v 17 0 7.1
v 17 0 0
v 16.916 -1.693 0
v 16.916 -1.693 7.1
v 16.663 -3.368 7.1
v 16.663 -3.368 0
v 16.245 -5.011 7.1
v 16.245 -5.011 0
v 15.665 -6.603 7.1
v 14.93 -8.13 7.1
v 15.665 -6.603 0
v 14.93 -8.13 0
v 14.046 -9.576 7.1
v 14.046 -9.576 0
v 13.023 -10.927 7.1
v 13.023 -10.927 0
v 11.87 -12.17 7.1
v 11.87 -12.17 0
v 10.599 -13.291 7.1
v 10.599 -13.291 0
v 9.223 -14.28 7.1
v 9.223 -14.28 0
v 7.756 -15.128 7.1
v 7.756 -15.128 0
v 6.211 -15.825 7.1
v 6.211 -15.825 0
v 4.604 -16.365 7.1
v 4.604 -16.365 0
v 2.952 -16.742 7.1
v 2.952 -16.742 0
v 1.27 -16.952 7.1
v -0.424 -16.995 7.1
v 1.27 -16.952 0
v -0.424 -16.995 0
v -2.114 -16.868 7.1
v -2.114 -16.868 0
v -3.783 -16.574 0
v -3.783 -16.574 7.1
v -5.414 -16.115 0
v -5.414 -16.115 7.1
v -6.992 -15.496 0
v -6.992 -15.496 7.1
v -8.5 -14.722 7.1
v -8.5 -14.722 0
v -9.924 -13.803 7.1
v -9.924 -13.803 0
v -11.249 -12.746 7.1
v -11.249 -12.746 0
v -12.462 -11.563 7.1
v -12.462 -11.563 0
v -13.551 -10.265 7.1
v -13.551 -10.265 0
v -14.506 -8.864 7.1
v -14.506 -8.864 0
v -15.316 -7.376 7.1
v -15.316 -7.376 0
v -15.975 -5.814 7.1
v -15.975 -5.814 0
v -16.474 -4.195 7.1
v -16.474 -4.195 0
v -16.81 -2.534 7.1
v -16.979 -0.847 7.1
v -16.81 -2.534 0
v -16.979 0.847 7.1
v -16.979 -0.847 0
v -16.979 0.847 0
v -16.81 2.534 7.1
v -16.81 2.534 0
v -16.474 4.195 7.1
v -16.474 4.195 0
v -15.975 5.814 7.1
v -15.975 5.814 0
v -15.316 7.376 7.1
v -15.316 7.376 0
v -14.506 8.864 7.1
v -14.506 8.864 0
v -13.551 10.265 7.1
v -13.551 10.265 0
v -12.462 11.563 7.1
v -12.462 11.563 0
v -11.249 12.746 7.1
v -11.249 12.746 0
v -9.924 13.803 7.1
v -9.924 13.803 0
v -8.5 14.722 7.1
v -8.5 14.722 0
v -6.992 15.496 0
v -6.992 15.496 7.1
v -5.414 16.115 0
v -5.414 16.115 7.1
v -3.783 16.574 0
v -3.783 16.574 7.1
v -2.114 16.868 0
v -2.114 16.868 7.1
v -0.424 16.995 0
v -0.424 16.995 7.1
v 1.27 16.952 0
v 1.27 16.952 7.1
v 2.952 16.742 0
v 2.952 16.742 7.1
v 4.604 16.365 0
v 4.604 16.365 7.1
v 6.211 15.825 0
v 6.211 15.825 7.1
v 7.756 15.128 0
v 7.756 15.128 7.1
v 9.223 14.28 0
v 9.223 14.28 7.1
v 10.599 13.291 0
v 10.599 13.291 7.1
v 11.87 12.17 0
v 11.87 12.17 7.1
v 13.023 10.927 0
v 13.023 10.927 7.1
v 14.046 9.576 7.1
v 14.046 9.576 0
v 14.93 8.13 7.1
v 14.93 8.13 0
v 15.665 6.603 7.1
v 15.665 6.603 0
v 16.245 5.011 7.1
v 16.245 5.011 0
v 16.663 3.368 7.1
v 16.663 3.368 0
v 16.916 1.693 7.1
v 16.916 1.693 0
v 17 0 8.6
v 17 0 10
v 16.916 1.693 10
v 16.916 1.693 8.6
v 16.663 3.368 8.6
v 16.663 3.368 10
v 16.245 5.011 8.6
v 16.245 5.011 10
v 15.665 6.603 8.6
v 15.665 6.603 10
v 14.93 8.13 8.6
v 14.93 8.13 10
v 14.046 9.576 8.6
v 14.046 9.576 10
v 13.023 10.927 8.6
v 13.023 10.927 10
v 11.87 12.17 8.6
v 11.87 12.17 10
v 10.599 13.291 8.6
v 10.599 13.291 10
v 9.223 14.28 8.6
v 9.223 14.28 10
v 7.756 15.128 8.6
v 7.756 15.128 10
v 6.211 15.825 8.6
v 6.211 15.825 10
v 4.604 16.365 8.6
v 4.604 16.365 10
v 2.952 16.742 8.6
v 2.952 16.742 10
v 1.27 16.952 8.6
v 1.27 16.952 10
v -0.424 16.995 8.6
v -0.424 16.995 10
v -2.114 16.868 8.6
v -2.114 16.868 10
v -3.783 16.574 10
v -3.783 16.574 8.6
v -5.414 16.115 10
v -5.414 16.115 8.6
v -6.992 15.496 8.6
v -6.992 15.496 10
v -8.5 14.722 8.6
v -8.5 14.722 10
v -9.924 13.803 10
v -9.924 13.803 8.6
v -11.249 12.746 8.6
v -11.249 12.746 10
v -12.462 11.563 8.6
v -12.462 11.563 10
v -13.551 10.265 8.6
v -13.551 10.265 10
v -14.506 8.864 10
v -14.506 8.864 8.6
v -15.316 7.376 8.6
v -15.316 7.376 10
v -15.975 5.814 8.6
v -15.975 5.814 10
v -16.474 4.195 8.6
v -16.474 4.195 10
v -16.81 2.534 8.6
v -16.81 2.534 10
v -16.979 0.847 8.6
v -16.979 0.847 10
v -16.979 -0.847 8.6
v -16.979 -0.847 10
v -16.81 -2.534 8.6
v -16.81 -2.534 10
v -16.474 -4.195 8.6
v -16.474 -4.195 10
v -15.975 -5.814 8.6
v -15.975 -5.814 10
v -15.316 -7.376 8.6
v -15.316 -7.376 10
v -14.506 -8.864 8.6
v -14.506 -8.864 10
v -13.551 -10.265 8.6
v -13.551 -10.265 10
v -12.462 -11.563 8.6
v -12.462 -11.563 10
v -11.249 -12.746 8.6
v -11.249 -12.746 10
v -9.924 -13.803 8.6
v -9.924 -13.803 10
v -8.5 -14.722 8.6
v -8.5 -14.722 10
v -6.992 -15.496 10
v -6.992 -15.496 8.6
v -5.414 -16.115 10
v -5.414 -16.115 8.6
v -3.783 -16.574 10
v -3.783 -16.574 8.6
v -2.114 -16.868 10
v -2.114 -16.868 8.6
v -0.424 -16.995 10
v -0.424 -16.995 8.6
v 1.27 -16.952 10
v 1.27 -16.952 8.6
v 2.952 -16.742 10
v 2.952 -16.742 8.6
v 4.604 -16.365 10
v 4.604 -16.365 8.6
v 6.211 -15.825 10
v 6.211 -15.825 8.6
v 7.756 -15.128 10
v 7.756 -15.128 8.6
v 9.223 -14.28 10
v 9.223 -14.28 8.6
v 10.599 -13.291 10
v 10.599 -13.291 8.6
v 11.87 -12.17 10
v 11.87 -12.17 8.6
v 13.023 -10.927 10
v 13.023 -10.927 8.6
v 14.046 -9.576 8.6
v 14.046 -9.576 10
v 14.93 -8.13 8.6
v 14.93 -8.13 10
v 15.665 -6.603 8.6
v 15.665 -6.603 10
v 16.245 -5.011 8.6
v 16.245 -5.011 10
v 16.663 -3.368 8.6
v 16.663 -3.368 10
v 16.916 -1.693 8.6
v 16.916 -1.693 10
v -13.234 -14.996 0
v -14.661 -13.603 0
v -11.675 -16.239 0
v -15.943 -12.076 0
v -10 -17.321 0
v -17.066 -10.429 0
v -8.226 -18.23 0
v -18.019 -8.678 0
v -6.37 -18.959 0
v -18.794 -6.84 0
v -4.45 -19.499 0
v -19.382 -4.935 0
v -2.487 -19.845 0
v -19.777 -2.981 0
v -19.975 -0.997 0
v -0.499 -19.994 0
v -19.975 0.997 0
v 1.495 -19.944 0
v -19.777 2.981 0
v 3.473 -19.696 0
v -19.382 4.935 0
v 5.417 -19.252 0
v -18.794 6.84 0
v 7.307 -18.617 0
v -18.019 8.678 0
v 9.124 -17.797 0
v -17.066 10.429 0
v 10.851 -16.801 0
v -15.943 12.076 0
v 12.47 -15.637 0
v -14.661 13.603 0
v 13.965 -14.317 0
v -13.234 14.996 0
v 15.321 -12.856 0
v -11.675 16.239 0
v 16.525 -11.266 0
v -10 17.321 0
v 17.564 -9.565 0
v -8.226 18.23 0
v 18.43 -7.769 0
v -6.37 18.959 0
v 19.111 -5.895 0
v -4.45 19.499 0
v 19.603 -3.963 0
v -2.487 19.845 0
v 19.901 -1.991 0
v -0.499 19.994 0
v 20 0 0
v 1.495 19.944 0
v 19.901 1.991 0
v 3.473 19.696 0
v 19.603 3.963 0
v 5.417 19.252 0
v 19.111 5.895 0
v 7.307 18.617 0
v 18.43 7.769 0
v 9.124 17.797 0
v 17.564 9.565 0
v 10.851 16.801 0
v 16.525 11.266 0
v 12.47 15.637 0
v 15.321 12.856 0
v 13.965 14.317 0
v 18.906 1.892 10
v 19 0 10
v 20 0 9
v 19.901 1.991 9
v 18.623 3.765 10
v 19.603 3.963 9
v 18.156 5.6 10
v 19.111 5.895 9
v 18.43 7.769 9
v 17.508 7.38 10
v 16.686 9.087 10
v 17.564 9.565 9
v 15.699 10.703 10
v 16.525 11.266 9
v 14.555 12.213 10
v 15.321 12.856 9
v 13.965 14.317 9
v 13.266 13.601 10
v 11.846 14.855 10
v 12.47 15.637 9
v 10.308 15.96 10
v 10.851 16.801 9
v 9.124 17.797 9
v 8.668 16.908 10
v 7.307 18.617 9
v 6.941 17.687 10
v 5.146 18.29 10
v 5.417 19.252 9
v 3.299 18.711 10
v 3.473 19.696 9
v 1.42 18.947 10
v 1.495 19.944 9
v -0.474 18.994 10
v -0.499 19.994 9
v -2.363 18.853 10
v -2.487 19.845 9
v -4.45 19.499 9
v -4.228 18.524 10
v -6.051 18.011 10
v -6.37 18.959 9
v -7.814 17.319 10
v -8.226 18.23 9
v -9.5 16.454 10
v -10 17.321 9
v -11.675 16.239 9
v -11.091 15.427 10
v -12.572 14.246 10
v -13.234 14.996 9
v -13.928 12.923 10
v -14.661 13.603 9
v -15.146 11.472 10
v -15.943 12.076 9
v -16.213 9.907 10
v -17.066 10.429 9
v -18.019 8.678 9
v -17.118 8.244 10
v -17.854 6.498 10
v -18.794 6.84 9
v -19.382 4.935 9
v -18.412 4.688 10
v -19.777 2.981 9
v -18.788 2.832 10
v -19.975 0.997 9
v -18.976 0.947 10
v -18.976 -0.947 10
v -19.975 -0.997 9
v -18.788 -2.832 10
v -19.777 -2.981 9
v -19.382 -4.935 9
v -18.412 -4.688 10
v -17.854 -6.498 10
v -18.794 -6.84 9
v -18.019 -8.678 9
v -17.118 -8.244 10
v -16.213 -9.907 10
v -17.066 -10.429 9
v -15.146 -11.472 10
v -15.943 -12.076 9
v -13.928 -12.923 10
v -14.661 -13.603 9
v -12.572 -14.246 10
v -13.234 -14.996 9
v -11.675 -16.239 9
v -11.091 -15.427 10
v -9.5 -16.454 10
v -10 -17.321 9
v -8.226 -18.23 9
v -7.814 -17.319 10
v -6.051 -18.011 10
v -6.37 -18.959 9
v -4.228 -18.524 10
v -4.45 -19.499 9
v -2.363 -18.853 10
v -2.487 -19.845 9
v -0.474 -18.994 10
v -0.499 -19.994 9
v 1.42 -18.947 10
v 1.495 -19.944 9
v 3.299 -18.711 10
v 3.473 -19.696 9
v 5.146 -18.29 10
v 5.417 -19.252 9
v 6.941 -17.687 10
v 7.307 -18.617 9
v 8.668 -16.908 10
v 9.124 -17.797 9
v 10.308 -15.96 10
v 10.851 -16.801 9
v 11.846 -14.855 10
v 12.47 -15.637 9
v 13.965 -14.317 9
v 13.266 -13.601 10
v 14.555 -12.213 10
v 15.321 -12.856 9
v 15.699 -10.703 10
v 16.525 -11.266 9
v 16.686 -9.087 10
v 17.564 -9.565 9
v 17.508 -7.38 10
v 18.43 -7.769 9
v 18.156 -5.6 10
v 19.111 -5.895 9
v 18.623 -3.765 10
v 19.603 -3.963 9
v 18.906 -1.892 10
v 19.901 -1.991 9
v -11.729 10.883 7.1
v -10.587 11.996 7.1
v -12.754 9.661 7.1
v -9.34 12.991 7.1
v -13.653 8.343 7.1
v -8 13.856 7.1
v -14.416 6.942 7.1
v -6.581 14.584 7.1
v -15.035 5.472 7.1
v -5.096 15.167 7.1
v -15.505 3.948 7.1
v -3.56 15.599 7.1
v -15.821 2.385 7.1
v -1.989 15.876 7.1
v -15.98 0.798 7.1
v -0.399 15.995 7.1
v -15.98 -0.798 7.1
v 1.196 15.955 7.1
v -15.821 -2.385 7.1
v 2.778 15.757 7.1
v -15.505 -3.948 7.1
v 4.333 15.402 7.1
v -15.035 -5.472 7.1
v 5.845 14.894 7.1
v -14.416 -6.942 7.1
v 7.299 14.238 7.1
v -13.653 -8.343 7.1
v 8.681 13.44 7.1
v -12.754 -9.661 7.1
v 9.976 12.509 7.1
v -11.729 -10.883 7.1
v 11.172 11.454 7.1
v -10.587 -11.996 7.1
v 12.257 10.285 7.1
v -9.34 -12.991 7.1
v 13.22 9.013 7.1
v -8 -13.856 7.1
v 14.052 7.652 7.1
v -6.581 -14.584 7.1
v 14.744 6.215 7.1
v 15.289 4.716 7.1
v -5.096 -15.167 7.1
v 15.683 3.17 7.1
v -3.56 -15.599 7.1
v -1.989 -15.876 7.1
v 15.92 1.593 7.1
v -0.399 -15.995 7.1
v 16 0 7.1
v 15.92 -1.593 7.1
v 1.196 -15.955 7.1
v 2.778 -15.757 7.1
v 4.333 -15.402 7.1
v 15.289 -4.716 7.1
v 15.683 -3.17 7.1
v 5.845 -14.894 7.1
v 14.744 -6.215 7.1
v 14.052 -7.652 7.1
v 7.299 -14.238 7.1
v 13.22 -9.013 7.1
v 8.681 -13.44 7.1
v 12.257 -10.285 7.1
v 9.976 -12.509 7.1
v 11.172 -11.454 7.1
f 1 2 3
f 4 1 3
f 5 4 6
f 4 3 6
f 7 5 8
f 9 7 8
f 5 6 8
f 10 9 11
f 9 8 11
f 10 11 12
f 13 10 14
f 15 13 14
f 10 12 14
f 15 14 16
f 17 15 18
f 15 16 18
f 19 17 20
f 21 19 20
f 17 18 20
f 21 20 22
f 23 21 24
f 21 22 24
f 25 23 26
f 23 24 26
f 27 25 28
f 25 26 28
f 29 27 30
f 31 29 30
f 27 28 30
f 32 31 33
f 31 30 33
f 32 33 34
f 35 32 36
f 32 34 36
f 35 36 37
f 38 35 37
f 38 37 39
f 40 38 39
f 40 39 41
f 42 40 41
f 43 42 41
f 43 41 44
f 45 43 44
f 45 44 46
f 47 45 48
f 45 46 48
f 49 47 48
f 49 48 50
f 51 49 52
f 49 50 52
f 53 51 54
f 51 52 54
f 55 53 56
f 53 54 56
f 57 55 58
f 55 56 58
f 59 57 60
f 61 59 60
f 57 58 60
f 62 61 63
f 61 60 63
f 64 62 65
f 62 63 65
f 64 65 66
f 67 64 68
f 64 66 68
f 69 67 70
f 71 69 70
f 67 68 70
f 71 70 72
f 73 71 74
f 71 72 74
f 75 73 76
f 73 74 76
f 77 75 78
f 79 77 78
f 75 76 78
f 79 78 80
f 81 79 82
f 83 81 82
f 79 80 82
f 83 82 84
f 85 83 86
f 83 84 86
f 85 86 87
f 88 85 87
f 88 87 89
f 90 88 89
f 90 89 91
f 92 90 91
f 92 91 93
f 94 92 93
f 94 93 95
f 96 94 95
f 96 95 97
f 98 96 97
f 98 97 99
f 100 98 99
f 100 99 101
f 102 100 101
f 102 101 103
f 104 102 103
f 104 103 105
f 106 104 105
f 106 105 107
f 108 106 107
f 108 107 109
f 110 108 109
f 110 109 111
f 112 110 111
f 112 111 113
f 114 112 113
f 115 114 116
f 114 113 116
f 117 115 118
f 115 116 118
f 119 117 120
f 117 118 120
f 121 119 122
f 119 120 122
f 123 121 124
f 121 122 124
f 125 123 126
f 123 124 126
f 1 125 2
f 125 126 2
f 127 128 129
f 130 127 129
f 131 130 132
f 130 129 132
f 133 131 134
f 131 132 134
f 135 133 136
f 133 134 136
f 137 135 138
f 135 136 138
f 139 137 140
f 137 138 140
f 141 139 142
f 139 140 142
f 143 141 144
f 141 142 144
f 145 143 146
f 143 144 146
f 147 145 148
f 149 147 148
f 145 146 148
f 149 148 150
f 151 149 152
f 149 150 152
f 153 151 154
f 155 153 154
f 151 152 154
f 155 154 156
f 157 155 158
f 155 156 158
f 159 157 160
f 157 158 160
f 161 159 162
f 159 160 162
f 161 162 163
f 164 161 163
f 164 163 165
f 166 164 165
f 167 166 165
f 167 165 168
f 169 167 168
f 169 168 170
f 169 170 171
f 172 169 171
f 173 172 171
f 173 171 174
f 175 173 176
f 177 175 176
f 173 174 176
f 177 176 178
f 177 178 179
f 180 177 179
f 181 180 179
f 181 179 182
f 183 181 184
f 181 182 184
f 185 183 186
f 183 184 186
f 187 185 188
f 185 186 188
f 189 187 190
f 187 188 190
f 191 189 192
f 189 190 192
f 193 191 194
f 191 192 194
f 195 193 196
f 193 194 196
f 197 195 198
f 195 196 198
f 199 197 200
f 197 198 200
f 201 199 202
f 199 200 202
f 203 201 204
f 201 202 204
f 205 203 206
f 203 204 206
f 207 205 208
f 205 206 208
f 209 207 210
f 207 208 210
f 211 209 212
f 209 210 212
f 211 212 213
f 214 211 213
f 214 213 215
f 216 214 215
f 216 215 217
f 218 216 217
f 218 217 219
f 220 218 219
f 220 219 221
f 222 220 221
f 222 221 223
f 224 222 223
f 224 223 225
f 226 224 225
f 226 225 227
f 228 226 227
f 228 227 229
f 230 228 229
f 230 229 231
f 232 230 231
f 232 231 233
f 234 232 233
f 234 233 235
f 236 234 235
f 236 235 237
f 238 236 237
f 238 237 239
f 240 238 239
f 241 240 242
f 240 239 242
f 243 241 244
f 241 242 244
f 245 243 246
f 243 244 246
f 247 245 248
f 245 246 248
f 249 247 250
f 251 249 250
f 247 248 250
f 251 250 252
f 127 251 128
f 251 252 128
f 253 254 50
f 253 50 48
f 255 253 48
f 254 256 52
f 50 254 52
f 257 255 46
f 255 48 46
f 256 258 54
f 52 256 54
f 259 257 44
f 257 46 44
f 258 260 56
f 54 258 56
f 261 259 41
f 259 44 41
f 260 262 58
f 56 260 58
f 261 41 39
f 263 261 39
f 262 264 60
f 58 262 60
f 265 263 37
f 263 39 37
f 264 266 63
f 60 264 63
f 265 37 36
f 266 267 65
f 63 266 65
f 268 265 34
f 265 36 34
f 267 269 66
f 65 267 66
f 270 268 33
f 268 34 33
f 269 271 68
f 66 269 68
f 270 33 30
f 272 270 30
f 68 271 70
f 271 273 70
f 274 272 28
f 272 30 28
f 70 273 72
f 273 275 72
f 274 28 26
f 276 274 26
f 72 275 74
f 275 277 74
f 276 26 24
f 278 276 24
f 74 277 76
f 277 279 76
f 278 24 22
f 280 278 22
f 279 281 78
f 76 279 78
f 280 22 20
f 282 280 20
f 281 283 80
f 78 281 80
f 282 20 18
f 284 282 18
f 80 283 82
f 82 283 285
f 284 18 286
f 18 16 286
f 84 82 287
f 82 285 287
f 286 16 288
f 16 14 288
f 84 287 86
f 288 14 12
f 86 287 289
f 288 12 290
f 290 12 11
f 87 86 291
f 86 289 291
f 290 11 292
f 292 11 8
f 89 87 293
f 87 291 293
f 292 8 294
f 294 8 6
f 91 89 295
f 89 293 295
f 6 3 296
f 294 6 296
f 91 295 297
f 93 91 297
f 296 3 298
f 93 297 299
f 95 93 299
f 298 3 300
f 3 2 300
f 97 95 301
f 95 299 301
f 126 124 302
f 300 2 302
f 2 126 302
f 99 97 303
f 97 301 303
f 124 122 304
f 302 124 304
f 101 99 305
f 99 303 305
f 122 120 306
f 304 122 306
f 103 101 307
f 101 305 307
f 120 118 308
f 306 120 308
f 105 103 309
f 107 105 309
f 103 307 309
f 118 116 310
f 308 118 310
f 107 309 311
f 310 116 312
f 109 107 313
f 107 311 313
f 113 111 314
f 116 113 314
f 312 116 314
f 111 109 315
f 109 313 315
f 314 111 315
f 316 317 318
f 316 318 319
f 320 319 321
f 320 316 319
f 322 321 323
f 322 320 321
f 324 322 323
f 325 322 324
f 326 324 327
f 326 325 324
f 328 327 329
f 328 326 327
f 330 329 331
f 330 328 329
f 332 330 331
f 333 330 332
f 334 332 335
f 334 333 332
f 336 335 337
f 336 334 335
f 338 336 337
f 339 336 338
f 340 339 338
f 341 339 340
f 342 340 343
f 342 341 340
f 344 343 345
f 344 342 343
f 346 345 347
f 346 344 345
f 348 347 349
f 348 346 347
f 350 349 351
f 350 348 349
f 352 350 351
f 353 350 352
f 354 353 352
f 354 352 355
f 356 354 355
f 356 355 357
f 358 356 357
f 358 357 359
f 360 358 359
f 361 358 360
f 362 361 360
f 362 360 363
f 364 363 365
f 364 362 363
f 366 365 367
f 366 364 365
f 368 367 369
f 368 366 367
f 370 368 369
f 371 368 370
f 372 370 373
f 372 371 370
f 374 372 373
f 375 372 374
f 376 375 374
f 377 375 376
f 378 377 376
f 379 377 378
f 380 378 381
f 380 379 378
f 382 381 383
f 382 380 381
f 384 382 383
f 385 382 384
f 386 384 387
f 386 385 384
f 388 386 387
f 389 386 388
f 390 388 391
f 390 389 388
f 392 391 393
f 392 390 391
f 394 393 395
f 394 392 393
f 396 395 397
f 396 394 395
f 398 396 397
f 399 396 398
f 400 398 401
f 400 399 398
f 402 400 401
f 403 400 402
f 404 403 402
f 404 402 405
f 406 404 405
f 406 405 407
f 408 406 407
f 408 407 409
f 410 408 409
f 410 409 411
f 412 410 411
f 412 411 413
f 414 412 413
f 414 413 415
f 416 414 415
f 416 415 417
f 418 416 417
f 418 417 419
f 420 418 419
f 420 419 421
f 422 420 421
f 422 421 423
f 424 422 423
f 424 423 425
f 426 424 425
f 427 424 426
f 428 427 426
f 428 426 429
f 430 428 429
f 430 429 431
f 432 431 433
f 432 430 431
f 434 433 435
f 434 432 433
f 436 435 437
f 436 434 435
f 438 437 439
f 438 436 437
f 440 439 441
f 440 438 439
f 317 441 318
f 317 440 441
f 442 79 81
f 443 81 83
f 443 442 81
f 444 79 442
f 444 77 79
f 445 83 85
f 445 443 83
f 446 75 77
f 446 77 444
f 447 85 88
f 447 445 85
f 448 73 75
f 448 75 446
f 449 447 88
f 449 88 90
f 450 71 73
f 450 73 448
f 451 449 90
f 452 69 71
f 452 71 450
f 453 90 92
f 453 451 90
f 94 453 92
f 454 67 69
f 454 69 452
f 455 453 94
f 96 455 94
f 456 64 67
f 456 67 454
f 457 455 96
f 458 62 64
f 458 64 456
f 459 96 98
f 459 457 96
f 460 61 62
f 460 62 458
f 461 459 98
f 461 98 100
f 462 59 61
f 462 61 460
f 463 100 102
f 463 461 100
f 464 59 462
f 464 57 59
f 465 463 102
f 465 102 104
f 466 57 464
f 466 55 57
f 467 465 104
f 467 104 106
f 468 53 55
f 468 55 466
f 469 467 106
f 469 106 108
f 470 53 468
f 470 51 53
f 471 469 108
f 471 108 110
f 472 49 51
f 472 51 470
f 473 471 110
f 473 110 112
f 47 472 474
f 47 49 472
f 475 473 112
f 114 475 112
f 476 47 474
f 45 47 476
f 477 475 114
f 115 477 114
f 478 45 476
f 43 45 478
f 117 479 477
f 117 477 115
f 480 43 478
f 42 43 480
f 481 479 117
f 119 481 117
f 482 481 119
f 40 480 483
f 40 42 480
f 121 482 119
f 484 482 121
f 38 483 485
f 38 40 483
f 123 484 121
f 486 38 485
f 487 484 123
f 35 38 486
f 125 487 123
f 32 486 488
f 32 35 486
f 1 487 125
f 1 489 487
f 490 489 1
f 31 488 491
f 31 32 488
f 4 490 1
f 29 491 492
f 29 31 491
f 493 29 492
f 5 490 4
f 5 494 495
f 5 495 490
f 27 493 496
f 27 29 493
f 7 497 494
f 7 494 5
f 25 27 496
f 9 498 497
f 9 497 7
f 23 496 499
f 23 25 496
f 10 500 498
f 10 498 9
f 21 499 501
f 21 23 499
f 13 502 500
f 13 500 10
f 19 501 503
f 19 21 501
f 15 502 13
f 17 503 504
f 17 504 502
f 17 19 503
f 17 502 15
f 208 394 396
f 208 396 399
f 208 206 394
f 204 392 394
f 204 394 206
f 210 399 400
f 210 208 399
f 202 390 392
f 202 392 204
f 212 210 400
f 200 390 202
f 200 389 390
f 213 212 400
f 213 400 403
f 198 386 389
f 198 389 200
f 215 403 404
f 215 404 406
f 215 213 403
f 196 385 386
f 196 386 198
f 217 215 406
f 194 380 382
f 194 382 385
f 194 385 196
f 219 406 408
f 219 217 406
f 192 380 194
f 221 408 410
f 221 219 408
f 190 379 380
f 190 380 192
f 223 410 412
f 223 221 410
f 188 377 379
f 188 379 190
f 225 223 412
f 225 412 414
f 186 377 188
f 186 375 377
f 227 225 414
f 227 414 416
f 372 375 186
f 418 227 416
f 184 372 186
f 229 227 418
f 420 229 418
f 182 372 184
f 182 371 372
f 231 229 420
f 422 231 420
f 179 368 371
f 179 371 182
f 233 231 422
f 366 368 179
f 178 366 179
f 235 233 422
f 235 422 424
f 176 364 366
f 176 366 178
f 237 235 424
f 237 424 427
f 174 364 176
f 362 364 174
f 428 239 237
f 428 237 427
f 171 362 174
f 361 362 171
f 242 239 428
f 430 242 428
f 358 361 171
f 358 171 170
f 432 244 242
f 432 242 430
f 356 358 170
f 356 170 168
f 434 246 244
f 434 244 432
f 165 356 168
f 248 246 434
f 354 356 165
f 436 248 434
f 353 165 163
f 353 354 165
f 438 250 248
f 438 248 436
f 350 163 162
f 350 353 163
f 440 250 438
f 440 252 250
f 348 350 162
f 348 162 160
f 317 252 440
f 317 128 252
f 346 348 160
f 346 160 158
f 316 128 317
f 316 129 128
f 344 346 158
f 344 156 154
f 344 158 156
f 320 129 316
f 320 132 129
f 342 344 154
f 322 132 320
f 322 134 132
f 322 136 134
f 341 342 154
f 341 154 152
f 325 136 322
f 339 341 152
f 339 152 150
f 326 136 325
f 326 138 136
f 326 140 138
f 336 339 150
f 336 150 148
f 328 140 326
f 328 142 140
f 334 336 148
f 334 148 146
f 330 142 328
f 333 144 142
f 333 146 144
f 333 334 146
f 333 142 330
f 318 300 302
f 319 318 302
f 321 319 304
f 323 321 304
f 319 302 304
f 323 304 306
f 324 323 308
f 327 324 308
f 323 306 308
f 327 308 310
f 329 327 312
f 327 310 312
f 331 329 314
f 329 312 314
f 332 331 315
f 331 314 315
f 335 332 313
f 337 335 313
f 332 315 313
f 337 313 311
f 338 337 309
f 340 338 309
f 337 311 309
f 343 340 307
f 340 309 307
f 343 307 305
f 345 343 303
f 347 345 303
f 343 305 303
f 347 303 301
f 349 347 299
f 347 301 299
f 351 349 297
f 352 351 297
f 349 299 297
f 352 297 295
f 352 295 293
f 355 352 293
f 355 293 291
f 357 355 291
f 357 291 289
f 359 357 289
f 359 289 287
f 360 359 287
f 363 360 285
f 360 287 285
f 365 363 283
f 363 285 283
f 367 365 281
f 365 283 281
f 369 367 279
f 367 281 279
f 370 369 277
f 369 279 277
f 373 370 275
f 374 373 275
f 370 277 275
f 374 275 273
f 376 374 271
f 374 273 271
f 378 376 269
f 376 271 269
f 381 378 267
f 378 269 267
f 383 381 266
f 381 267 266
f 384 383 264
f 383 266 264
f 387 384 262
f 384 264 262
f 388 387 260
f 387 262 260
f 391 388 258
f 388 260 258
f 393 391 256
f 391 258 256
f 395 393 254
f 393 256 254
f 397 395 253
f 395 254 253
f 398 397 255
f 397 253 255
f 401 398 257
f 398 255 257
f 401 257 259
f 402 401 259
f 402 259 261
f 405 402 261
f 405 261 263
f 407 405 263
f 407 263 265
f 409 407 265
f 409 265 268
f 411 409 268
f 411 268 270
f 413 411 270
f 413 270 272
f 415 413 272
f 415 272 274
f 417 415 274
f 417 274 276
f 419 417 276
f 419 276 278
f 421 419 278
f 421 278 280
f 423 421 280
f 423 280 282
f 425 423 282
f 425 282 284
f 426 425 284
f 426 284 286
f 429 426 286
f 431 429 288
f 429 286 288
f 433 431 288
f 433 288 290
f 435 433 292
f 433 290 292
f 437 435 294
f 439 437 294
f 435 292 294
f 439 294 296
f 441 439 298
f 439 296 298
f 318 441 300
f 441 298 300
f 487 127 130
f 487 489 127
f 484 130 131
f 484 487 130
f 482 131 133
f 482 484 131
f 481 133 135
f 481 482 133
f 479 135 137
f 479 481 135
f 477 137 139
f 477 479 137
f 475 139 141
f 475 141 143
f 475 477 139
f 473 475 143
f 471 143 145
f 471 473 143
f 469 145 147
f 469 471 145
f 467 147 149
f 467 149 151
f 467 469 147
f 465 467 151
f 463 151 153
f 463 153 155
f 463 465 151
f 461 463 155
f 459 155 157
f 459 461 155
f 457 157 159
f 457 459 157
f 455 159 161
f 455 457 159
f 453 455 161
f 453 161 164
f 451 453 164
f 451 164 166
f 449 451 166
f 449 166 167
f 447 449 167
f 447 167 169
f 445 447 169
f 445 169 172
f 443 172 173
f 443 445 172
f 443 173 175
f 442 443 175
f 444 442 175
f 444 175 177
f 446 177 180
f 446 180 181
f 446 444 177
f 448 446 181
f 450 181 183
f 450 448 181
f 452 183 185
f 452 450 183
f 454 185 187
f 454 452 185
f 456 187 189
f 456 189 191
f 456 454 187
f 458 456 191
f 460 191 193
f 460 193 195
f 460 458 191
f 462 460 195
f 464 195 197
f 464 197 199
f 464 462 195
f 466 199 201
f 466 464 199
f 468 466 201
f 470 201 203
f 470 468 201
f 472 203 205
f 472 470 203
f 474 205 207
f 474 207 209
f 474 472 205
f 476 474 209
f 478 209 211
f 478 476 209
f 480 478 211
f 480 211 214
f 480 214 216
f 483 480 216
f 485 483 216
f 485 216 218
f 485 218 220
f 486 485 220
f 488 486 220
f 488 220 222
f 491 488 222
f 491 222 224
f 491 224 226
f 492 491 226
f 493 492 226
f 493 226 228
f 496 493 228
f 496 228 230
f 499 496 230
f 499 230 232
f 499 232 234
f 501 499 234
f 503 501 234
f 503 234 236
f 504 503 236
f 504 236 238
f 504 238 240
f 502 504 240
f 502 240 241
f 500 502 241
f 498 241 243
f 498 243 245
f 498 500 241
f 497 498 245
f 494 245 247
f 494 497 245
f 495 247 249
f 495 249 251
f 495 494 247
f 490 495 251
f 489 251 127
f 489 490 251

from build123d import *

# Parameters (mm, degrees)
F0_R      = 20
F1_DEPTH  = 10
F2_R      = 17
F3_DEPTH  = 1.4
F3_FACE_R = 17
F5_R      = 16
F7_R      = 17
F8_DEPTH  = 7.1
F9_SIZE   = 1


with BuildPart() as f1:
    # F0 (on Top) → F1 (new body)
    with BuildSketch(Plane.XY):
        Circle(F0_R)
    extrude(amount=F1_DEPTH)

    # F2 (on face) → F3 (cut)
    with BuildSketch(Plane.XY.offset(10)):
        Circle(F2_R)
    extrude(amount=-F3_DEPTH, mode=Mode.SUBTRACT)

    # F3_face (on face) → F6 section 0
    with BuildSketch(Plane.XY.offset(8.6)):
        Circle(F3_FACE_R)
    # F5 (on offset) → F6 section 1
    with BuildSketch(Plane.XY.offset(7.1)):
        Circle(F5_R)
    loft(mode=Mode.SUBTRACT)

    # F7 (on face) → F8 (cut, through all)
    with BuildSketch(Plane(origin=(0, 0, 0), x_dir=(1, 0, 0), z_dir=(0, 0, -1))):
        Circle(F7_R)
    extrude(amount=-F8_DEPTH, mode=Mode.SUBTRACT)

    # F9
    f9_edges = [f1.edges().sort_by_distance(p)[0] for p in [
        (-20, 0, 10),
    ]]
    chamfer(f9_edges, length=F9_SIZE)


solid = f1.part
